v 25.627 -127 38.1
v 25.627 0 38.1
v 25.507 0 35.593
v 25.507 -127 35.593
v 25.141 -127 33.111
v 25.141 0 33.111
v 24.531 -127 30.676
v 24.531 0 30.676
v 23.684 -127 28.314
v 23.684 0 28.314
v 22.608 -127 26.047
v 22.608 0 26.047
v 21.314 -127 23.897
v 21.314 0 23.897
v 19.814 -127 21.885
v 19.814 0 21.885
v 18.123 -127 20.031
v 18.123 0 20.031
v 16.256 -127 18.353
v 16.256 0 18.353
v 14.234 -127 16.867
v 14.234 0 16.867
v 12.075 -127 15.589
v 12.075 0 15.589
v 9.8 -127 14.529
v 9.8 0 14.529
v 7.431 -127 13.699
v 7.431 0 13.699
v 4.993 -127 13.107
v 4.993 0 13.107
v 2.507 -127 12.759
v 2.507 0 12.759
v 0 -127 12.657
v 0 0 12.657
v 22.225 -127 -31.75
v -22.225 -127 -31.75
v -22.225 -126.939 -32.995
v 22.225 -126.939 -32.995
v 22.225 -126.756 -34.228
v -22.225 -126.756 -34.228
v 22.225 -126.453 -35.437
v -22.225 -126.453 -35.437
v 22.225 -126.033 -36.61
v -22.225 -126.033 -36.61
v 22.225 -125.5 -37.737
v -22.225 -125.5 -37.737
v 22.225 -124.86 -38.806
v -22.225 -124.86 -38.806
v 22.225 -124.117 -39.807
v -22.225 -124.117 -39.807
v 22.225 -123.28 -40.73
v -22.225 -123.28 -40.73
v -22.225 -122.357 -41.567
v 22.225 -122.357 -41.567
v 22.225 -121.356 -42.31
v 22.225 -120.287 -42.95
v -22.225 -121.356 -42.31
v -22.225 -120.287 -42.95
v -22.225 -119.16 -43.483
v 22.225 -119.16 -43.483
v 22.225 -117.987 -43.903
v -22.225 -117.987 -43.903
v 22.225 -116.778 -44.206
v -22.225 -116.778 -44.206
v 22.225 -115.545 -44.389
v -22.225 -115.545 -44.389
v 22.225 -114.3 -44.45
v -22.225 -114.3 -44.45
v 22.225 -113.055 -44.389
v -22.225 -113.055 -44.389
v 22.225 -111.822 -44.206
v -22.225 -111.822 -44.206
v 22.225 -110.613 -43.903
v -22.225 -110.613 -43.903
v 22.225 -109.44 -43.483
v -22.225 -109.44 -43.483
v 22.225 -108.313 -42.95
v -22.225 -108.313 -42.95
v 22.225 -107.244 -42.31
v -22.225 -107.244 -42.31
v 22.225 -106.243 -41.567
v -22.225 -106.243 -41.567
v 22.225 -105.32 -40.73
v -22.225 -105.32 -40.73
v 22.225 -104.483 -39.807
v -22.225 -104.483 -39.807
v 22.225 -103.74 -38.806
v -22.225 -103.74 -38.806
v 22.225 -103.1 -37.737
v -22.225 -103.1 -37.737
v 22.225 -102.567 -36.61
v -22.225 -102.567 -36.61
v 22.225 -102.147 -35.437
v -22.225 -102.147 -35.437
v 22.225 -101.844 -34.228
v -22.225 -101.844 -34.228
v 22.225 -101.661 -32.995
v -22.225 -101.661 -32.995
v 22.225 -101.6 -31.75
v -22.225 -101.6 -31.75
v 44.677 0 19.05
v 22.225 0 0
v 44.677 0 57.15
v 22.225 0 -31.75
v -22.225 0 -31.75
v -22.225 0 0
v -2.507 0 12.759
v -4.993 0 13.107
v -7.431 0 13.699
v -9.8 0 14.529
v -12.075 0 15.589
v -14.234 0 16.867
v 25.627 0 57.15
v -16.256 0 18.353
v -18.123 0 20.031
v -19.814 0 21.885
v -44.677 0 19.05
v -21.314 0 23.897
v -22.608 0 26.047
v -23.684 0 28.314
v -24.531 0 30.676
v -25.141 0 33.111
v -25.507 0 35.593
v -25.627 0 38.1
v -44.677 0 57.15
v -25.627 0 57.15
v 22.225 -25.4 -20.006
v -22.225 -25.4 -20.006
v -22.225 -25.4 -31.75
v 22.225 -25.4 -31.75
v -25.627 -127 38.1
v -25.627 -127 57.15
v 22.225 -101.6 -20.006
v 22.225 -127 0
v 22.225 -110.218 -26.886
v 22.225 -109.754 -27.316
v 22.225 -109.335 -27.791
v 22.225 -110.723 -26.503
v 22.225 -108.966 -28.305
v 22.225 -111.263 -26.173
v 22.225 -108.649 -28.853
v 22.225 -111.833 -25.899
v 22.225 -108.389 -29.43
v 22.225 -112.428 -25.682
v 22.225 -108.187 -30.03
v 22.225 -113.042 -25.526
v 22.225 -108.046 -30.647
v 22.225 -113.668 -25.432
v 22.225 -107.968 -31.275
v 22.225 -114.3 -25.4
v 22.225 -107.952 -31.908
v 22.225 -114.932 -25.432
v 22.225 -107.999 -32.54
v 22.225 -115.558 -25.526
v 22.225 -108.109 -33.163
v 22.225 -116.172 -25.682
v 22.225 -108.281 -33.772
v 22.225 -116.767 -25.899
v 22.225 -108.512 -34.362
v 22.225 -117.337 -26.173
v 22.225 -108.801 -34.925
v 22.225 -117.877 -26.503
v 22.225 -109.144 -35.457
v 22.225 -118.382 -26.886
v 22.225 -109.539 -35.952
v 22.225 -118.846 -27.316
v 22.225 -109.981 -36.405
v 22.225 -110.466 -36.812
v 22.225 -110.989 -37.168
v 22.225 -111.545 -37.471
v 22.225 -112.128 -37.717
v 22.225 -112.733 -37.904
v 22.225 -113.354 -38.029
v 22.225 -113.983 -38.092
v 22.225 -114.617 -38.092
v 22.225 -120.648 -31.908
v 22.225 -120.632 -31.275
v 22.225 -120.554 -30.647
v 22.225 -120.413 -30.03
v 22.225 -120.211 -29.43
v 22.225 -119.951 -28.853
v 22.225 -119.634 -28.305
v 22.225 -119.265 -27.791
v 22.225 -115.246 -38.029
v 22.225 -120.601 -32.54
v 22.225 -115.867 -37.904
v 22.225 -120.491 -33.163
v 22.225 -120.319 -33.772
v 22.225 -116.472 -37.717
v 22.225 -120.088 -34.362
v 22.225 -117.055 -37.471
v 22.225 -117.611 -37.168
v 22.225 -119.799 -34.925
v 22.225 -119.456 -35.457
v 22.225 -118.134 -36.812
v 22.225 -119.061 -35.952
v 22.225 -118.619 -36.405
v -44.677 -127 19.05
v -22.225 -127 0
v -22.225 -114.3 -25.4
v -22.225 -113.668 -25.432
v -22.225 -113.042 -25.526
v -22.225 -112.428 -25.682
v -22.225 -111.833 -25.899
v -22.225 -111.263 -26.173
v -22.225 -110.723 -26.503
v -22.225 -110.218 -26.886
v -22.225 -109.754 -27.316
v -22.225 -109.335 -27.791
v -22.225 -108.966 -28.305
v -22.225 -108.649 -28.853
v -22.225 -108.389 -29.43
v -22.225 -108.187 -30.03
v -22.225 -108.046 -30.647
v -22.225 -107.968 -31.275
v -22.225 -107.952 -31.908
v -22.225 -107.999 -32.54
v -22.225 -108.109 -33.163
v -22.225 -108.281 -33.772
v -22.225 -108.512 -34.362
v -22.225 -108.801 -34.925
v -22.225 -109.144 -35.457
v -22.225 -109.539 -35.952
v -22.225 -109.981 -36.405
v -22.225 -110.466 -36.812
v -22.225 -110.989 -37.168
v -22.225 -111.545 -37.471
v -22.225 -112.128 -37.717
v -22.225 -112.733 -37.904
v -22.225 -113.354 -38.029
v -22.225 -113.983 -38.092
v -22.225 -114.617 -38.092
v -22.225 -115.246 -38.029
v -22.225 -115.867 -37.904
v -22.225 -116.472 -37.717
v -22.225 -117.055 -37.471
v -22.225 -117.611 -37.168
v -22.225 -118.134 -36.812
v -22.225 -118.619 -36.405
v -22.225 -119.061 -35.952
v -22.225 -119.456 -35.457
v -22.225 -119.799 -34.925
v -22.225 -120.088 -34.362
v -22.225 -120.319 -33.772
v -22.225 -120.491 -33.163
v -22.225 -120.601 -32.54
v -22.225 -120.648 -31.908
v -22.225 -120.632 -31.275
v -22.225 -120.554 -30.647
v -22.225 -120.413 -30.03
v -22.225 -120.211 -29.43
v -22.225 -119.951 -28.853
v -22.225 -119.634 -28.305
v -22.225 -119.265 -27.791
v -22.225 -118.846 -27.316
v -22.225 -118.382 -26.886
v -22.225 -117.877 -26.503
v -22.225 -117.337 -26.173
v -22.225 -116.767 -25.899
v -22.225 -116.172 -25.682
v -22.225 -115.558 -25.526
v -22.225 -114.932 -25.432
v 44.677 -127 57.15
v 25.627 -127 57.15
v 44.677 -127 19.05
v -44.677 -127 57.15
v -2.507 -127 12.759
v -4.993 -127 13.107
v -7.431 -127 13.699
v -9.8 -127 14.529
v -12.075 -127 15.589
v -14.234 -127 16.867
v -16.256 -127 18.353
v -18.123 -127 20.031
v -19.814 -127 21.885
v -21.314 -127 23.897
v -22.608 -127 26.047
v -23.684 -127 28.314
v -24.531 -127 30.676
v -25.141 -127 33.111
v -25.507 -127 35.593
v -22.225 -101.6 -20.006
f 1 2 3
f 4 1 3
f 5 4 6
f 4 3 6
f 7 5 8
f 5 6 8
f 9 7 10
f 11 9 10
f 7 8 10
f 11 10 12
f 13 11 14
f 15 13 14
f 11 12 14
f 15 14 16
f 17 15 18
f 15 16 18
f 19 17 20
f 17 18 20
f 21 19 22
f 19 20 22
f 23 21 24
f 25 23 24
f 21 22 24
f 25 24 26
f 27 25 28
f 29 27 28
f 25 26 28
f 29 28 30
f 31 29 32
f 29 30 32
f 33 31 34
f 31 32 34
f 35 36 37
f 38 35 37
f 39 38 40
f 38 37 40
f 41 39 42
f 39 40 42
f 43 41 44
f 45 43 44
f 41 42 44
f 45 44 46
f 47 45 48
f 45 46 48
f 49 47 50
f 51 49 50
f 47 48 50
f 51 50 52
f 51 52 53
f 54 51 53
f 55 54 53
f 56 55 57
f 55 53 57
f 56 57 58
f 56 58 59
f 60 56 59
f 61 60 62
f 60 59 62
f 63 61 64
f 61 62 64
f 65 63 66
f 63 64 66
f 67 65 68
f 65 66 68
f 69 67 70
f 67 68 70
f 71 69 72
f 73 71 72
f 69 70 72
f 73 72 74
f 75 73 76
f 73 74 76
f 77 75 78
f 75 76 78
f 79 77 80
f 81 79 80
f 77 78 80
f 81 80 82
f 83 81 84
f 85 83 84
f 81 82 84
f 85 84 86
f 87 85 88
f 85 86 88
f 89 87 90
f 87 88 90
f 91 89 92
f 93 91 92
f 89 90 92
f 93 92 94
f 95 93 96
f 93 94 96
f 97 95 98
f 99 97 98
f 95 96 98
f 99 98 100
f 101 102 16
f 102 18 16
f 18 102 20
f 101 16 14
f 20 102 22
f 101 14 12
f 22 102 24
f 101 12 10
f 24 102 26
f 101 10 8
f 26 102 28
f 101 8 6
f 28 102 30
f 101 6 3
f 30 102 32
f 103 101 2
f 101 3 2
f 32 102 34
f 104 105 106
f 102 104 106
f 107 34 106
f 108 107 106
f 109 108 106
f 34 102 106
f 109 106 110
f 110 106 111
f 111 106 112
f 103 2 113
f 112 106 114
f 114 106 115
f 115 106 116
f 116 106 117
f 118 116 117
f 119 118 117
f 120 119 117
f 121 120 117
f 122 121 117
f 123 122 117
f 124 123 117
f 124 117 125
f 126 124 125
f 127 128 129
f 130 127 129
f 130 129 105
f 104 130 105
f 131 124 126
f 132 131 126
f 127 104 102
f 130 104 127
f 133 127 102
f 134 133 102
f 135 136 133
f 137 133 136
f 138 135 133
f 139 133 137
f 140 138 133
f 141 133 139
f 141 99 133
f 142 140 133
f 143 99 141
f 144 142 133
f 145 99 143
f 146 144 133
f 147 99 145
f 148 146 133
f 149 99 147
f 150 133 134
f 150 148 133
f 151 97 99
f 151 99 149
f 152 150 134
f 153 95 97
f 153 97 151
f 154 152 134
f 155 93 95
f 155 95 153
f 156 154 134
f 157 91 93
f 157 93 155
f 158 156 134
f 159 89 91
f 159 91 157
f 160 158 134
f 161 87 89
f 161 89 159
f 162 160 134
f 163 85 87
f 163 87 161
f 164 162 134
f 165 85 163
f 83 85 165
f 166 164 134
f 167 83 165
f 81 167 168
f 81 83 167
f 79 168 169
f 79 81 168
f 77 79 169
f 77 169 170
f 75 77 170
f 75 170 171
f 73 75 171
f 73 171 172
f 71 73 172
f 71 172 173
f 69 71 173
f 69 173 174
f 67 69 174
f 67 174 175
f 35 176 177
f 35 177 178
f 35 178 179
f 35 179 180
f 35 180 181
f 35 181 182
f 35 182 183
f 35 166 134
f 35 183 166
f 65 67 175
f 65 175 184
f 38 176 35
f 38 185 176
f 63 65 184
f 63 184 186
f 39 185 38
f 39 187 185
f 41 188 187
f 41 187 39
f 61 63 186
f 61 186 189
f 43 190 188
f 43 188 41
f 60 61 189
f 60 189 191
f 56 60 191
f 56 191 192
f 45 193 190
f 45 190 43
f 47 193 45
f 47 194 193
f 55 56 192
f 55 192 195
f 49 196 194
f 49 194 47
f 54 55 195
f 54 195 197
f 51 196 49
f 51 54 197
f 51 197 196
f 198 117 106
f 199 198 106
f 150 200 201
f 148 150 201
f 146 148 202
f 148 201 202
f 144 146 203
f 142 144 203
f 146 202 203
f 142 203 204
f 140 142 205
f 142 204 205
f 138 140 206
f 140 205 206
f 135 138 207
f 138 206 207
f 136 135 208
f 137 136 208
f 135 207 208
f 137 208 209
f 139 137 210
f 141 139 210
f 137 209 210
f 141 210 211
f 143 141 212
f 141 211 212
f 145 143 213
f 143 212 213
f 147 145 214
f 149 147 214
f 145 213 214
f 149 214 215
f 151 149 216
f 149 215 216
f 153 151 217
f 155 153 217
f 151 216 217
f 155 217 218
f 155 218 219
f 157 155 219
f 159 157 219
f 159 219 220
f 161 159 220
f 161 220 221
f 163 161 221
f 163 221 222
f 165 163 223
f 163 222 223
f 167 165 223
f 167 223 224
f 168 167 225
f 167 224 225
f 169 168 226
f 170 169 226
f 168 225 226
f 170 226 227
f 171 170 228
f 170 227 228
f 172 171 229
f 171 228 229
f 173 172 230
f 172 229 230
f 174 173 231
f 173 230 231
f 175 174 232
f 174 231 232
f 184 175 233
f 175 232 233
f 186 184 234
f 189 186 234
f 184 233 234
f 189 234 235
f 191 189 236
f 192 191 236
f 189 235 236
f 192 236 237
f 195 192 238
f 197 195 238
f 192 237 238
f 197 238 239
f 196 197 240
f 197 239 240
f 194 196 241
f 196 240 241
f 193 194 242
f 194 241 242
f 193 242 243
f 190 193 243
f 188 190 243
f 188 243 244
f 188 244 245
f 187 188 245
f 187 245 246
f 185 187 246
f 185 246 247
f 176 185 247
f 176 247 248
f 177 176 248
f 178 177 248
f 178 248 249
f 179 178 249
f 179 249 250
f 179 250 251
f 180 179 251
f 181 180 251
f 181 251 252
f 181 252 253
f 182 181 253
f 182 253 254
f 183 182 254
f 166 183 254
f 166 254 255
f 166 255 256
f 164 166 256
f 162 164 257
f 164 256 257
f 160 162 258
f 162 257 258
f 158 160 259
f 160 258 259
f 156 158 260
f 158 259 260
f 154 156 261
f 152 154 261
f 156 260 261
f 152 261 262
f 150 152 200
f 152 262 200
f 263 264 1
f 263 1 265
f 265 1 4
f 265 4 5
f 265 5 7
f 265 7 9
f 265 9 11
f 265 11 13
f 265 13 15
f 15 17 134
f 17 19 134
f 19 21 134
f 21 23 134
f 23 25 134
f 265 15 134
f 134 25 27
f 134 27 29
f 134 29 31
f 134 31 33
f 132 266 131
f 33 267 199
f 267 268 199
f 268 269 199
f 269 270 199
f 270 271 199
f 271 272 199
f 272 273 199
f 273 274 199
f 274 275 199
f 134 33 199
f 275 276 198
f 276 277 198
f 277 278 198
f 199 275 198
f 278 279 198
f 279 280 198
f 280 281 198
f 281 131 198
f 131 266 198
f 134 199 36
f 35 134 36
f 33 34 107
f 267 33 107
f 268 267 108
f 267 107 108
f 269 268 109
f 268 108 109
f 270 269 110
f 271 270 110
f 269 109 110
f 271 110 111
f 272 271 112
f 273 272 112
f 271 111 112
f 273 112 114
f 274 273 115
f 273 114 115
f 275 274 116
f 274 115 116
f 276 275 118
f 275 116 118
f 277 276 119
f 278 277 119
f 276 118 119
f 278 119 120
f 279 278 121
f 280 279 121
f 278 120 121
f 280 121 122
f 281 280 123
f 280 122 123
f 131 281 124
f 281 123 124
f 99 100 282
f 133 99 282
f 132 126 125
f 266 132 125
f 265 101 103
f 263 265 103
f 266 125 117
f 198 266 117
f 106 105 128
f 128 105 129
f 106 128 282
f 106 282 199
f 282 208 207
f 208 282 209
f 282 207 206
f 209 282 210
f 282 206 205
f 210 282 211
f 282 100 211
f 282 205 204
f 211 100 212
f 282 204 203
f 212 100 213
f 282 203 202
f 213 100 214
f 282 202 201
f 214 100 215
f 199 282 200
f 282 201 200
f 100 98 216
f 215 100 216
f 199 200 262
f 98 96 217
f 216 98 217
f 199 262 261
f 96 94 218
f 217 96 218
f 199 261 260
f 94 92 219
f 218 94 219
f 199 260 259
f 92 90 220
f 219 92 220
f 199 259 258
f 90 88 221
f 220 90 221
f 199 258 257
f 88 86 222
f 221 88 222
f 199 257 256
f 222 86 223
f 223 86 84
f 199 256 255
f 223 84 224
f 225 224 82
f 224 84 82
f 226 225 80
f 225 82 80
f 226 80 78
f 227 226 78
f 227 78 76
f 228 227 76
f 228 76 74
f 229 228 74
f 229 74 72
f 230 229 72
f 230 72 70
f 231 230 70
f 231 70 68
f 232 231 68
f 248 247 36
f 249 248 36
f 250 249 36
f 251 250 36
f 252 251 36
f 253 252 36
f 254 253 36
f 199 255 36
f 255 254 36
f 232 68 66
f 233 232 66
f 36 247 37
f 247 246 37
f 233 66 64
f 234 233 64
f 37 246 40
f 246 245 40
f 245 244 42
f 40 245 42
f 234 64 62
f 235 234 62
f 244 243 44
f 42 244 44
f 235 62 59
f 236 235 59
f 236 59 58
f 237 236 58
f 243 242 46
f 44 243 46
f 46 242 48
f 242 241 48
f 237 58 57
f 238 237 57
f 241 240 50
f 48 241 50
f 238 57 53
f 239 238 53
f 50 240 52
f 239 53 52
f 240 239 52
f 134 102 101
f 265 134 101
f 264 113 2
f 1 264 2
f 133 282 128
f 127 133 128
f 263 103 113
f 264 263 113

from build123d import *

# Parameters (mm, degrees)
BOSS_EXTRUDE1_DEPTH = 127
SKETCH2_R           = 6.35
BOSS_EXTRUDE3_DEPTH = 44.45


with BuildPart() as part:
    # Sketch1 → Boss-Extrude1 (new body)
    with BuildSketch(Plane(origin=(0, 0, 0), x_dir=(1, 0, 0), z_dir=(0, 1, 0))):
        with BuildLine():
            ThreePointArc((25.626778658, -38.1), (18.122521252, -20.031067918), (0, -12.657167374))
            ThreePointArc((0, -12.657167374), (-18.122521252, -20.031067918), (-25.626778658, -38.1))
            Line((-25.626778658, -38.1), (-25.626778658, -57.15))
            Line((-25.626778658, -57.15), (-44.676778658, -57.15))
            Line((-44.676778658, -57.15), (-44.676778658, -19.05))
            Line((-44.676778658, -19.05), (-22.225, 0))
            Line((-22.225, 0), (22.225, 0))
            Line((22.225, 0), (44.676778658, -19.05))
            Line((44.676778658, -19.05), (44.676778658, -57.15))
            Line((44.676778658, -57.15), (25.626778658, -57.15))
            Line((25.626778658, -57.15), (25.626778658, -38.1))
        make_face()
    extrude(amount=-BOSS_EXTRUDE1_DEPTH)

    # Sketch2 → Boss-Extrude3 (add)
    with BuildSketch(Plane(origin=(-22.225, 0, 0), x_dir=(0, 1, 0), z_dir=(-1, 0, 0))):
        with BuildLine():
            Line((-127, 0), (-127, 31.75))
            ThreePointArc((-127, 31.75), (-114.3, 44.45), (-101.6, 31.75))
            Line((-101.6, 31.75), (-101.6, 20.00617362))
            Line((-101.6, 20.00617362), (-25.4, 20.00617362))
            Line((-25.4, 20.00617362), (-25.4, 31.75))
            Line((-25.4, 31.75), (0, 31.75))
            Line((0, 31.75), (0, 0))
            Line((0, 0), (-127, 0))
        make_face()
        with Locations(Location((-114.3, 31.75, 0), (0, 0, 270))):
            Circle(SKETCH2_R, mode=Mode.SUBTRACT)
    extrude(amount=-BOSS_EXTRUDE3_DEPTH)


solid = part.part
